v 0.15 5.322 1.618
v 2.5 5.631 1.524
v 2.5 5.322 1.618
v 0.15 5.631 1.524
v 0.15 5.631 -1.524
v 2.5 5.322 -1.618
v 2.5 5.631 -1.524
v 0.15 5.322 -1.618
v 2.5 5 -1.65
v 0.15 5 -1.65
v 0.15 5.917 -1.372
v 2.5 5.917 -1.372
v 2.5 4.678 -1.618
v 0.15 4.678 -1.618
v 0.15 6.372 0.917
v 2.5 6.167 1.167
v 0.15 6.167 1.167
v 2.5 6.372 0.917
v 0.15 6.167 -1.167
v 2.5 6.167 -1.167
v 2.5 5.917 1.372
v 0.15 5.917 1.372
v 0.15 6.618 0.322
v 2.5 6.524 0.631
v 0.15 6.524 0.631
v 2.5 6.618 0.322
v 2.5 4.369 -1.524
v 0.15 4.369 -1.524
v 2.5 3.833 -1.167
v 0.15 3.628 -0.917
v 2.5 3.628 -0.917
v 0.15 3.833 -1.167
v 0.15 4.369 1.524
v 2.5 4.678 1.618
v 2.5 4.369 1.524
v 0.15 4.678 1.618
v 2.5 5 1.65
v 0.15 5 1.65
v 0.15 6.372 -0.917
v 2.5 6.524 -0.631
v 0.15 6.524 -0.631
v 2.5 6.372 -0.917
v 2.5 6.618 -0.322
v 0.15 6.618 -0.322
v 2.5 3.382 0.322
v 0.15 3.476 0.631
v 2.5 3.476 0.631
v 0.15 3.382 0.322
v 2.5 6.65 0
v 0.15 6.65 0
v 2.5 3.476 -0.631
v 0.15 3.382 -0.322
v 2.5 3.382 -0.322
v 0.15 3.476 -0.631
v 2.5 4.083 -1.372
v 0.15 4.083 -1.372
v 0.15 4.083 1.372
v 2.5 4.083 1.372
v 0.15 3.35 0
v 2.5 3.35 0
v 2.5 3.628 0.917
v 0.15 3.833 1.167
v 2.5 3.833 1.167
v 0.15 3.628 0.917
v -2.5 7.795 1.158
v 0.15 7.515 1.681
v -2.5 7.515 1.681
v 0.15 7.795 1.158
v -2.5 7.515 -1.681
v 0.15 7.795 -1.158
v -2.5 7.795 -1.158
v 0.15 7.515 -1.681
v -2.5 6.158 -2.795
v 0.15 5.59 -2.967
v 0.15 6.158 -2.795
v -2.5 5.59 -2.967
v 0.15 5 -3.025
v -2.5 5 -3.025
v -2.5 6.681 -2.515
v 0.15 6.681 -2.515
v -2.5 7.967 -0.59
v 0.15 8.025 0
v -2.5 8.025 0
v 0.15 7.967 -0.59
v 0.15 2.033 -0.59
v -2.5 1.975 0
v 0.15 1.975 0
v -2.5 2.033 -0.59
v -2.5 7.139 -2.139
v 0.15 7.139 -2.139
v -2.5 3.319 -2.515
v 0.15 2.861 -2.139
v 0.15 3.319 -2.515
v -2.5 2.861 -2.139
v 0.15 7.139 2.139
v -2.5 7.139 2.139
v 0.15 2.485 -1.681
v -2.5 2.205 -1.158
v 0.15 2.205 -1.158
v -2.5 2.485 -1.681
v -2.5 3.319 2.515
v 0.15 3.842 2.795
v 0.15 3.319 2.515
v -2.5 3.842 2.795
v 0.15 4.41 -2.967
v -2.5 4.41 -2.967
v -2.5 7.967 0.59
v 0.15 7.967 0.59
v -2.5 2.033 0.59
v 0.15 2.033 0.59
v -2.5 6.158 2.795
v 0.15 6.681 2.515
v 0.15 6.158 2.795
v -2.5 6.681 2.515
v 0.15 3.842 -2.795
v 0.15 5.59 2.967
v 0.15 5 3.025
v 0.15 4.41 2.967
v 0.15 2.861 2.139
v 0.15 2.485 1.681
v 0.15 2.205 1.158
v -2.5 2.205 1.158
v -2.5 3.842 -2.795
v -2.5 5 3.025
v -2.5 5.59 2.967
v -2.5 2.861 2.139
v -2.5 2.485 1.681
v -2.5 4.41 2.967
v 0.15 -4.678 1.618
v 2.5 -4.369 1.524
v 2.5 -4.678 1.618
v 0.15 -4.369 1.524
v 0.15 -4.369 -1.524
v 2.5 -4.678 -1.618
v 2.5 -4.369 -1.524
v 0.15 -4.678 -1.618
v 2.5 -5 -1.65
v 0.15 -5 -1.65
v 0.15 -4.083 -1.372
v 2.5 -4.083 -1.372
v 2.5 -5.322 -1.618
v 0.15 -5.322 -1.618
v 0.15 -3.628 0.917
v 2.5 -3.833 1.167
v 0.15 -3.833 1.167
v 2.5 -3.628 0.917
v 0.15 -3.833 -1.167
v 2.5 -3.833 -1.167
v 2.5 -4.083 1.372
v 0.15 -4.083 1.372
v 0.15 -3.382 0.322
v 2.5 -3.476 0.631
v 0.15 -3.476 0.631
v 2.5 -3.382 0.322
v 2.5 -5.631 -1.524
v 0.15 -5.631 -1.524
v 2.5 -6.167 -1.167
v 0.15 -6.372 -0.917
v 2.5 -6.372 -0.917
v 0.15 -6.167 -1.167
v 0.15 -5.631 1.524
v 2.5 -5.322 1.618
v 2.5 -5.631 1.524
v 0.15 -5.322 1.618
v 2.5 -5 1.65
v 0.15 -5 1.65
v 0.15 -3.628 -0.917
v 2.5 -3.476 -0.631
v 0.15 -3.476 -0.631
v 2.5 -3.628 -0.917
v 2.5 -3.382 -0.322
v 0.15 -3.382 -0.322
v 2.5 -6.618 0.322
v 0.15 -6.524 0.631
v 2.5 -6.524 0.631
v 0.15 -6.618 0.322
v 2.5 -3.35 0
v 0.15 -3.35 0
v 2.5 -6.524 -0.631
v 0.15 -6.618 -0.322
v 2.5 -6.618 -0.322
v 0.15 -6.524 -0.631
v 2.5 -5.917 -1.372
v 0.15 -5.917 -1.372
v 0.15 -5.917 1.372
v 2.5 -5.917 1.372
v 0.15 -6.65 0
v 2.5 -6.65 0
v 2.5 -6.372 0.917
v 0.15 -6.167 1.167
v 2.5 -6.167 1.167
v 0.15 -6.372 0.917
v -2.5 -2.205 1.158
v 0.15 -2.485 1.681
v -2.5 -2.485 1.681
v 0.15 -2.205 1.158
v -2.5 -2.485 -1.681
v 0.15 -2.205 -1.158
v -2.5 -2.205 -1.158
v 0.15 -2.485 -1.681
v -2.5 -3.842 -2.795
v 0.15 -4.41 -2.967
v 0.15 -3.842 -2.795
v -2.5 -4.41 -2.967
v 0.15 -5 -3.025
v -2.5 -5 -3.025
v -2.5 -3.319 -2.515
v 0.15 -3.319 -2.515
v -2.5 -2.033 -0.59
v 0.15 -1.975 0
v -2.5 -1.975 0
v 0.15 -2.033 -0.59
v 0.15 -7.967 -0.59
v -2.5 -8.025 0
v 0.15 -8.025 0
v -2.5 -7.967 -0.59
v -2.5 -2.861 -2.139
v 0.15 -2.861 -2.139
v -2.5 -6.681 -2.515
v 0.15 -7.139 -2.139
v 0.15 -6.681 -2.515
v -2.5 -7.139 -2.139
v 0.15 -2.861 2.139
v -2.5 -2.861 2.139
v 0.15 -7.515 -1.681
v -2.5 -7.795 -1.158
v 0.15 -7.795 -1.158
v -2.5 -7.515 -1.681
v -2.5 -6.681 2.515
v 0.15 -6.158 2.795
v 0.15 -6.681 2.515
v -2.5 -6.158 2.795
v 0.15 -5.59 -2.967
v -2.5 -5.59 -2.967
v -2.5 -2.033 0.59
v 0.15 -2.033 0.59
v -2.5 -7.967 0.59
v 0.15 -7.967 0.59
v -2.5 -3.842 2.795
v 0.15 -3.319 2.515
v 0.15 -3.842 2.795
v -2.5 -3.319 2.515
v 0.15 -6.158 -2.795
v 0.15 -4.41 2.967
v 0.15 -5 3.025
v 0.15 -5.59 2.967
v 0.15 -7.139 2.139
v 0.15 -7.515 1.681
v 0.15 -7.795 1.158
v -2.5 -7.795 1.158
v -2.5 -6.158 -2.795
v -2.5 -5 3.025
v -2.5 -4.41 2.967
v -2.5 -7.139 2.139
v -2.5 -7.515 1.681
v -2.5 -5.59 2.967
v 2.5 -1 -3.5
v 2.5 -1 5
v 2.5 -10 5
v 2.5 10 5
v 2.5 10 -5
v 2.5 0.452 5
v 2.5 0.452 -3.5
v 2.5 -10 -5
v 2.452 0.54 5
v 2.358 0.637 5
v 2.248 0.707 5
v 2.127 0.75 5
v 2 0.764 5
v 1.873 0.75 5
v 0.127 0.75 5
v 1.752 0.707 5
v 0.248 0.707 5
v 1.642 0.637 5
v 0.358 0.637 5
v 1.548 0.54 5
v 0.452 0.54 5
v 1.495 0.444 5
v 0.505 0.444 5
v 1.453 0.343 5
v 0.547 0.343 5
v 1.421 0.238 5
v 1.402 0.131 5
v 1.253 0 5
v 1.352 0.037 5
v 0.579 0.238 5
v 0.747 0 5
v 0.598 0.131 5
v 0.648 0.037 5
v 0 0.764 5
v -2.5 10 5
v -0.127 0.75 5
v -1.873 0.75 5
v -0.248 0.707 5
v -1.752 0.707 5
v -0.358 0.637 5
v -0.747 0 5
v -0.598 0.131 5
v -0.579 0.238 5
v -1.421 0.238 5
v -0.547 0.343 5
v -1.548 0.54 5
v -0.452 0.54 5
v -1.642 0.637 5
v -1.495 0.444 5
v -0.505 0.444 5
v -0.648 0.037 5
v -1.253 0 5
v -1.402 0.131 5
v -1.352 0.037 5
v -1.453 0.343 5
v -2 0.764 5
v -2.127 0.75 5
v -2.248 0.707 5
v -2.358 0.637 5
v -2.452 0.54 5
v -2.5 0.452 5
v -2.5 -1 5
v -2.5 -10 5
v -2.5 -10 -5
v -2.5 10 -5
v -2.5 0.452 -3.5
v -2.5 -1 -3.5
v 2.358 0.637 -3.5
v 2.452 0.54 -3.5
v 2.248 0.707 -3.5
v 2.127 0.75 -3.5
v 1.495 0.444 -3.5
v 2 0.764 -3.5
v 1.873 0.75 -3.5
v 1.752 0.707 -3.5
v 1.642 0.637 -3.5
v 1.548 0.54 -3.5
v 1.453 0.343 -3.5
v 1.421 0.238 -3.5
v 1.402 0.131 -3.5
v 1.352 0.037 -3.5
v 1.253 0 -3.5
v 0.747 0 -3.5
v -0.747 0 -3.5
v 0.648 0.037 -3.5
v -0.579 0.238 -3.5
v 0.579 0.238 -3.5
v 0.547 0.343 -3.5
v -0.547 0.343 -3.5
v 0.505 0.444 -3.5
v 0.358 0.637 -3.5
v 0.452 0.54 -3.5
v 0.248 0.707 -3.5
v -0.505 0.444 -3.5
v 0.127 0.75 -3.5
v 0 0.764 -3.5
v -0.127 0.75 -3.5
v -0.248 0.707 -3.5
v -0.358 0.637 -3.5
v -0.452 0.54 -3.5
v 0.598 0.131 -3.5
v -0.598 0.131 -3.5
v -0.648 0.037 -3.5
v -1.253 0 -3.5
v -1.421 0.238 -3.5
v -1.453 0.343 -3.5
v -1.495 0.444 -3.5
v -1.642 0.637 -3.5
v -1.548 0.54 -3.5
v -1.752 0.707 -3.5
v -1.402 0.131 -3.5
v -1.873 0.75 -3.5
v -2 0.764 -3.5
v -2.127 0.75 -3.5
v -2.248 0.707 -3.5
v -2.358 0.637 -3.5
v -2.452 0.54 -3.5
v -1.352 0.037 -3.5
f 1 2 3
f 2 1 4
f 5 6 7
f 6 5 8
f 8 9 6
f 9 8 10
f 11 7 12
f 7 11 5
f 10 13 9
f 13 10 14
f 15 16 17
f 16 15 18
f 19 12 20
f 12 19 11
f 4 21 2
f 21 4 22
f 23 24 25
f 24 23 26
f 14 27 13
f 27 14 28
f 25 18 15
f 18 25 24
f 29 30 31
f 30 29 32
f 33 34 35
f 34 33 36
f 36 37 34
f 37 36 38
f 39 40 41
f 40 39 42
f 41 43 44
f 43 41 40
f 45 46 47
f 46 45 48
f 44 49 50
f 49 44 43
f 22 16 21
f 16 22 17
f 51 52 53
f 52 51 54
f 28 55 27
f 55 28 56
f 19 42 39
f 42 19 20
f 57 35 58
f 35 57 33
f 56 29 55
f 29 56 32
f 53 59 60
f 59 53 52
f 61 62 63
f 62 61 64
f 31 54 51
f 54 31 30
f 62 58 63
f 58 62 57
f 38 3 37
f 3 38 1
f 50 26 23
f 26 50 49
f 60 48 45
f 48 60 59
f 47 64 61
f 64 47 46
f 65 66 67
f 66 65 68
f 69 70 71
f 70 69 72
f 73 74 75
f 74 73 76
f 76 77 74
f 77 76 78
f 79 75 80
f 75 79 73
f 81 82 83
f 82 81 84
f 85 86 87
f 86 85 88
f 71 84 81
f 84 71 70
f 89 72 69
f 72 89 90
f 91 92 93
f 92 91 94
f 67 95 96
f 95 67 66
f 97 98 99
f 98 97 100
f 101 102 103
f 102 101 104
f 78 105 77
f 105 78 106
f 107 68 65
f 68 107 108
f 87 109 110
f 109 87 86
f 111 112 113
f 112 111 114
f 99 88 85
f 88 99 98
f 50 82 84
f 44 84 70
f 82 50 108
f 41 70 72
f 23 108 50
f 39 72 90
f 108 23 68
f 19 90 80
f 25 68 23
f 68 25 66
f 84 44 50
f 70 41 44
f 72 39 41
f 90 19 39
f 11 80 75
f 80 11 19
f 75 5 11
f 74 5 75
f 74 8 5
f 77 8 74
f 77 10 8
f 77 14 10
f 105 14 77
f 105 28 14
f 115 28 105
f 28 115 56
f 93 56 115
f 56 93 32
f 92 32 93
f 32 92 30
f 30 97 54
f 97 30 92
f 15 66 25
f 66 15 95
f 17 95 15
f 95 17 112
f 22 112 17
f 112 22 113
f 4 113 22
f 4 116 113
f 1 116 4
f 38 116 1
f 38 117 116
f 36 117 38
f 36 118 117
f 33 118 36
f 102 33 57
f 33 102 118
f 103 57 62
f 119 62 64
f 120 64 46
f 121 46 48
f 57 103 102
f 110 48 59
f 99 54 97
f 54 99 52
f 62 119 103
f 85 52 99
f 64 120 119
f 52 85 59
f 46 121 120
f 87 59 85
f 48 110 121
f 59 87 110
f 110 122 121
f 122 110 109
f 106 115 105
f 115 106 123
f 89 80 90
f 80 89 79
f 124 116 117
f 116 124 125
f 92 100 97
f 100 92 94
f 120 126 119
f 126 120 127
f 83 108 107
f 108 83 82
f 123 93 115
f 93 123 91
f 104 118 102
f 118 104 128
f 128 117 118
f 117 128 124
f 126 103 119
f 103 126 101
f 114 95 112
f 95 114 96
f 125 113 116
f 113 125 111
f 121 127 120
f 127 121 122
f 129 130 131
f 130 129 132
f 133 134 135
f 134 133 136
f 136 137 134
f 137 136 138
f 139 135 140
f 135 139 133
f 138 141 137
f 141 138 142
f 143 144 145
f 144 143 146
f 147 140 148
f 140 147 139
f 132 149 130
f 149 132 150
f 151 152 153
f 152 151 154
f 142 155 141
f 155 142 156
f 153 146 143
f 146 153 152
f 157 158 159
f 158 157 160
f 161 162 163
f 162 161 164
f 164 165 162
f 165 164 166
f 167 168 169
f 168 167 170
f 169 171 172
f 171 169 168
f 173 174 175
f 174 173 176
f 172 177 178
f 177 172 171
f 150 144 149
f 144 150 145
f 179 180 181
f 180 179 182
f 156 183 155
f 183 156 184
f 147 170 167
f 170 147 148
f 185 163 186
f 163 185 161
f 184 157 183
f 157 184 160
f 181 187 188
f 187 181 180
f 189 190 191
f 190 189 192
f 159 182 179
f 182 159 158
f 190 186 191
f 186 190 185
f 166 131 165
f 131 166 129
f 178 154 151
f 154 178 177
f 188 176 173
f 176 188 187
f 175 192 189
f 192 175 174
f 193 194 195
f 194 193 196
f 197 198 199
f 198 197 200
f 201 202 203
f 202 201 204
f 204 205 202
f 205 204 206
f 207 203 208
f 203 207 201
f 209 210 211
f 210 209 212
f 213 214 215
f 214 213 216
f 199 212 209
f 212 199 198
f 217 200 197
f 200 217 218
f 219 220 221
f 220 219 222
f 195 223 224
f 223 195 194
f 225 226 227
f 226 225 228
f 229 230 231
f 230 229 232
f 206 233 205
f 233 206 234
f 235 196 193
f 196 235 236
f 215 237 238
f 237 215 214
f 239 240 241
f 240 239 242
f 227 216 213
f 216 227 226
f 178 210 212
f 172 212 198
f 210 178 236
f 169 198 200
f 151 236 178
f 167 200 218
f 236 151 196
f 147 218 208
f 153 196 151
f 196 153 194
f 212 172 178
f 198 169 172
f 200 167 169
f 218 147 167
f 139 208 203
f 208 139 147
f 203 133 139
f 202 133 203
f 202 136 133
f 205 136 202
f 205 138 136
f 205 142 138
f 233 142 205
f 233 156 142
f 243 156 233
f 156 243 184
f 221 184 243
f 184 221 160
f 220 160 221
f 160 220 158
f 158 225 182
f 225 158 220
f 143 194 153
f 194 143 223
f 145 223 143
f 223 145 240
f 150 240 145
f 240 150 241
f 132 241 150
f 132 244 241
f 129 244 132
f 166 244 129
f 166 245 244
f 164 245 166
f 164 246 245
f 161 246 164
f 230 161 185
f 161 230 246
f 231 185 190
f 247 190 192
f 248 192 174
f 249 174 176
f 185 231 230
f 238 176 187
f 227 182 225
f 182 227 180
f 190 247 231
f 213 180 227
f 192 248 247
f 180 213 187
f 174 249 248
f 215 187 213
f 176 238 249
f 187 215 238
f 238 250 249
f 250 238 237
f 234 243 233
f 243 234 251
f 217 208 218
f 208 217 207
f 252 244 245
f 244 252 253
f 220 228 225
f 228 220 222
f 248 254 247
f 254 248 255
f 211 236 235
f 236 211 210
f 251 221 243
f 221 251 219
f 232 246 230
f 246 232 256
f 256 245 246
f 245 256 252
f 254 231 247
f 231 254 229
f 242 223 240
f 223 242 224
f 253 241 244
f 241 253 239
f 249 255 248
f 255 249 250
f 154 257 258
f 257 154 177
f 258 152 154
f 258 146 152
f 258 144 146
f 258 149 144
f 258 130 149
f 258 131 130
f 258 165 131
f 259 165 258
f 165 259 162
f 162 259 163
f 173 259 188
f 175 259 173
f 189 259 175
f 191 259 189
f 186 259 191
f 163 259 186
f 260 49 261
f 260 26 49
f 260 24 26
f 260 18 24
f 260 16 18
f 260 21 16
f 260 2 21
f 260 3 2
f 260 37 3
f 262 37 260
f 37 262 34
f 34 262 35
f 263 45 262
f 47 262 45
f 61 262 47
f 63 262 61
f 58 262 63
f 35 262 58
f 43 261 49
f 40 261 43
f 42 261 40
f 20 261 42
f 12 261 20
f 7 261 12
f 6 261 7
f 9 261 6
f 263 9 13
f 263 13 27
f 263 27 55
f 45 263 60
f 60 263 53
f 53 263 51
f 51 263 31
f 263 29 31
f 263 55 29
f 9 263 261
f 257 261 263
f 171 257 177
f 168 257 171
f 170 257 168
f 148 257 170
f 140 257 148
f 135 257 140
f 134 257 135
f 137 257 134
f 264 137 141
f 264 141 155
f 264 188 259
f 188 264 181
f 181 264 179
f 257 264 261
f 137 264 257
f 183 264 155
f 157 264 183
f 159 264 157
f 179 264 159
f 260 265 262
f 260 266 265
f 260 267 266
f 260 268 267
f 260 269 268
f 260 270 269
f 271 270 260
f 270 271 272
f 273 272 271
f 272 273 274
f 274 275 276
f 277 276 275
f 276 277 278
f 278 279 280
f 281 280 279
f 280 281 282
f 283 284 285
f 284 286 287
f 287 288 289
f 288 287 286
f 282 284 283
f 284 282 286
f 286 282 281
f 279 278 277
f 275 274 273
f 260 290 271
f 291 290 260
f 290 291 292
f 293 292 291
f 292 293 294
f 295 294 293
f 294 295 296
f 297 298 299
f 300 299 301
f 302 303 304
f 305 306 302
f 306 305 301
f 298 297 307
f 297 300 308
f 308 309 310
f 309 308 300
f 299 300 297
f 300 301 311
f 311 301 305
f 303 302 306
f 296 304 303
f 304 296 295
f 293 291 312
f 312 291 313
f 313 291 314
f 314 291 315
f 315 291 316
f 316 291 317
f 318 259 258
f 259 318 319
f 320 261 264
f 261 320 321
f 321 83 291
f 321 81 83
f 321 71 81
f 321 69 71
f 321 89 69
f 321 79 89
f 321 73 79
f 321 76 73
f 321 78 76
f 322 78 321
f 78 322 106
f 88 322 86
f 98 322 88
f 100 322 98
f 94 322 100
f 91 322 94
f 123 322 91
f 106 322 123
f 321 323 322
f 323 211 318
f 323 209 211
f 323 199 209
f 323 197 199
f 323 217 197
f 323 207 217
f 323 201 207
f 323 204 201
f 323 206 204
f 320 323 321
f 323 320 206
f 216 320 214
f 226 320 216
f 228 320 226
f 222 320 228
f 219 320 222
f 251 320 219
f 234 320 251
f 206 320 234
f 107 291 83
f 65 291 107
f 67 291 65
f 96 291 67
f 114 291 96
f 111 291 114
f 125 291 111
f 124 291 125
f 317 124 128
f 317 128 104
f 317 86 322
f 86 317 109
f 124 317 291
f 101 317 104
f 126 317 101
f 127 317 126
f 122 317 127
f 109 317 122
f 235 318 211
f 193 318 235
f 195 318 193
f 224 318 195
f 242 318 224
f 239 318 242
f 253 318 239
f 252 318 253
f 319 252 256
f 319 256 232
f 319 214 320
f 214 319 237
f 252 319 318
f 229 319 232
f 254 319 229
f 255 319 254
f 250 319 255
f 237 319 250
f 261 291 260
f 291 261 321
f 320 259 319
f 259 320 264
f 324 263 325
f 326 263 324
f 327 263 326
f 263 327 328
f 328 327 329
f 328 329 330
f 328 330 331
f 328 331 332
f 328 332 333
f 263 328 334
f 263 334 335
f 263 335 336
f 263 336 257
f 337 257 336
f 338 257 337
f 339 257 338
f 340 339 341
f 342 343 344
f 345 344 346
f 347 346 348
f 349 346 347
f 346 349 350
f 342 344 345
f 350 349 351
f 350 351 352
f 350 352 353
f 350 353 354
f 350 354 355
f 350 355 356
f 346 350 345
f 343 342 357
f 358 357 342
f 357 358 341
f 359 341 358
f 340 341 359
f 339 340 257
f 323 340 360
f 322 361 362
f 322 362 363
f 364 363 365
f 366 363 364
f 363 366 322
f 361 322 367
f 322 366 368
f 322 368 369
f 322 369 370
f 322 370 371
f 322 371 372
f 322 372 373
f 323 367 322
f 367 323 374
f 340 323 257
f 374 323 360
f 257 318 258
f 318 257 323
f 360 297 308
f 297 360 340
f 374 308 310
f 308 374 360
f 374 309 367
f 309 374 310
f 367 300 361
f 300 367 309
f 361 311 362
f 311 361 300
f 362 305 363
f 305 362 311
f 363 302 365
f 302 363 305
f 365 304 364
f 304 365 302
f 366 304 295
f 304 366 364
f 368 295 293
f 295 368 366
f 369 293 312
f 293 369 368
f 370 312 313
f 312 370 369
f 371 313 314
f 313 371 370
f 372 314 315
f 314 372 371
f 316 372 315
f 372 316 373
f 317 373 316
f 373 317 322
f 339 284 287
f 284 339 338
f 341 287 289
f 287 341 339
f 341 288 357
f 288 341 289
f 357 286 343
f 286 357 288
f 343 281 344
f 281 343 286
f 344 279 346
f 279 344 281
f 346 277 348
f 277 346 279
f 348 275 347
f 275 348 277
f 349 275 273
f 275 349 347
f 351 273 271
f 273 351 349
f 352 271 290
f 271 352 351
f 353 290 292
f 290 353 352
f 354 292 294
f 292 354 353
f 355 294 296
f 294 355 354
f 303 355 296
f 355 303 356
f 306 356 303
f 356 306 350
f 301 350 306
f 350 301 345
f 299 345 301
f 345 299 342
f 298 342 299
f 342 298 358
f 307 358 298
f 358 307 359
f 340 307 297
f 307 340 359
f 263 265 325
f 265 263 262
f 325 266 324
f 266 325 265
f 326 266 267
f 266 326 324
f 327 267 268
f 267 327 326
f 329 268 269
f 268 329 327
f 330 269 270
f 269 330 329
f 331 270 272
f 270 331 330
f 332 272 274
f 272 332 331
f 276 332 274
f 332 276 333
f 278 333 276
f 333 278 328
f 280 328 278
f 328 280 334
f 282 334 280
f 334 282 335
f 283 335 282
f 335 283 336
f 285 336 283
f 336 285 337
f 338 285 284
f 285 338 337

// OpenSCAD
// file: ../library.scad
module lm8uu (shaft_length=100) {
  d = 15.5;
  l = 24+1;
  cylinder(d=8+4, h=shaft_length, center=true);
  cylinder(d=d, h=l, center=true);
}

module lm8uu_zip_tie (thickness, width) {
  d = 15.5;
  cylinder(d=15.5+thickness*2, h=width, center=true);
  translate([0,0+(d+thickness)/2,0]) cube([100,thickness,width], center=true);
  translate([0,0-(d+thickness)/2,0]) cube([100,thickness,width], center=true);
}

module m3_mounting_hole(use_insert_nuts=false) {
  if (!use_insert_nuts) {
    translate([0, 0, 0]) rotate([90,0,0]) cylinder(d=3+0.5, h=8);
    slot_width = 5.5+0.6;
    slot_depth = 2.4+0.6;
    translate([0, -2-(slot_depth)/2, 0]) cube([slot_width,slot_depth,100], center=true);
  } else {
    translate([0, 0 + 2.5 - 5, 0]) rotate([90,0,0]) cylinder(d=4, h=5, center=true);
  }
}

function screw_head_diameter(screw_diameter) = lookup(screw_diameter, [
   [1.4, 2.6],
   [1.6, 3],
   [2.0, 3.8],
   [2.5, 4.5],
   [3.0, 5.5],
   [4.0, 7],
   [5.0, 8.5],
   [6.0, 10],
   [8.0, 13],
   [ 10, 16],
   [ 12, 18],
   [ 14, 21],
   [ 16, 24],
   [ 18, 27],
   [ 20, 30]
 ]);

// scale allows for better fit of screw in hole
// seperation avoids overhands when printing screw hole with head at bottom
module screw (d, l, head=true, scale=1.1, separation=0) { 
  half_scale = (1+(scale-1)/2);
  cylinder(h=l, d=d*scale, center=false);
  if (head) {translate([0,0,-d*half_scale]) cylinder(
    d=screw_head_diameter(d)*scale,
    h=d*scale-separation
  );}
}

module GT2_tooth(h) {
  extra_width = 0.5;
  translate([-1,-0.5-extra_width,0]) cube([2,0.5+extra_width,h]);
  linear_extrude(height=h) polygon([[0.747183,-0.5],[0.747183,0],[0.647876,0.037218],[0.598311,0.130528],[0.578556,0.238423],[0.547158,0.343077],[0.504649,0.443762],[0.451556,0.53975],[0.358229,0.636924],[0.2484,0.707276],[0.127259,0.750044],[0,0.76447],[-0.127259,0.750044],[-0.2484,0.707276],[-0.358229,0.636924],[-0.451556,0.53975],[-0.504797,0.443762],[-0.547291,0.343077],[-0.578605,0.238423],[-0.598311,0.130528],[-0.648009,0.037218],[-0.747183,0],[-0.747183,-0.5]]);
}

module nema17(height, screw_mask_height=0, screw_mask_slot_length=0, center_mask_height=2.5) {
  difference() {
    translate([0,0,-height/2]) hull() {
      cube([42.3, 31, height], center=true);
      cube([31, 42.3, height], center=true);
    }
    translate([31/2,31/2,-4.5]) cylinder(h=9,d=3);
    translate([31/2,-31/2,-4.5]) cylinder(h=9,d=3);
    translate([-31/2,31/2,-4.5]) cylinder(h=9,d=3);
    translate([-31/2,-31/2,-4.5]) cylinder(h=9,d=3);
  }
  cylinder(h=center_mask_height, d=22+2);
  cylinder(h=27, d=5+2);
    
  screw_slot( 31/2, 31/2);
  screw_slot( 31/2,-31/2);
  screw_slot(-31/2, 31/2);
  screw_slot(-31/2,-31/2);
  
  module screw_slot(x, y) { hull() {
    dx = x > 0 ? screw_mask_slot_length/2 : -screw_mask_slot_length/2;
    dy = y > 0 ? screw_mask_slot_length/2 : -screw_mask_slot_length/2;
    translate([x+dx,y+dy,screw_mask_height]) rotate([180,0,0]) screw(d=3, l=screw_mask_height, d=3, head=false);
    translate([x-dx,y-dy,screw_mask_height]) rotate([180,0,0]) screw(d=3, l=screw_mask_height, d=3, head=false);
  }}
}
// main file
$fn=32;
use <../library.scad>;

difference() {
  difference() {
    translate([0,0,0]) cube([5,20,10], center=true);
    translate([0, 5,0]) rotate([0,90,0]) screw(d=3, l=3);
    translate([0,-5,0]) rotate([0,90,0]) screw(d=3, l=3);
  }
  for(i = [-3:3]) translate([i*2,0,-(6+1)/2]) GT2_tooth(h=6+1+2);
}
